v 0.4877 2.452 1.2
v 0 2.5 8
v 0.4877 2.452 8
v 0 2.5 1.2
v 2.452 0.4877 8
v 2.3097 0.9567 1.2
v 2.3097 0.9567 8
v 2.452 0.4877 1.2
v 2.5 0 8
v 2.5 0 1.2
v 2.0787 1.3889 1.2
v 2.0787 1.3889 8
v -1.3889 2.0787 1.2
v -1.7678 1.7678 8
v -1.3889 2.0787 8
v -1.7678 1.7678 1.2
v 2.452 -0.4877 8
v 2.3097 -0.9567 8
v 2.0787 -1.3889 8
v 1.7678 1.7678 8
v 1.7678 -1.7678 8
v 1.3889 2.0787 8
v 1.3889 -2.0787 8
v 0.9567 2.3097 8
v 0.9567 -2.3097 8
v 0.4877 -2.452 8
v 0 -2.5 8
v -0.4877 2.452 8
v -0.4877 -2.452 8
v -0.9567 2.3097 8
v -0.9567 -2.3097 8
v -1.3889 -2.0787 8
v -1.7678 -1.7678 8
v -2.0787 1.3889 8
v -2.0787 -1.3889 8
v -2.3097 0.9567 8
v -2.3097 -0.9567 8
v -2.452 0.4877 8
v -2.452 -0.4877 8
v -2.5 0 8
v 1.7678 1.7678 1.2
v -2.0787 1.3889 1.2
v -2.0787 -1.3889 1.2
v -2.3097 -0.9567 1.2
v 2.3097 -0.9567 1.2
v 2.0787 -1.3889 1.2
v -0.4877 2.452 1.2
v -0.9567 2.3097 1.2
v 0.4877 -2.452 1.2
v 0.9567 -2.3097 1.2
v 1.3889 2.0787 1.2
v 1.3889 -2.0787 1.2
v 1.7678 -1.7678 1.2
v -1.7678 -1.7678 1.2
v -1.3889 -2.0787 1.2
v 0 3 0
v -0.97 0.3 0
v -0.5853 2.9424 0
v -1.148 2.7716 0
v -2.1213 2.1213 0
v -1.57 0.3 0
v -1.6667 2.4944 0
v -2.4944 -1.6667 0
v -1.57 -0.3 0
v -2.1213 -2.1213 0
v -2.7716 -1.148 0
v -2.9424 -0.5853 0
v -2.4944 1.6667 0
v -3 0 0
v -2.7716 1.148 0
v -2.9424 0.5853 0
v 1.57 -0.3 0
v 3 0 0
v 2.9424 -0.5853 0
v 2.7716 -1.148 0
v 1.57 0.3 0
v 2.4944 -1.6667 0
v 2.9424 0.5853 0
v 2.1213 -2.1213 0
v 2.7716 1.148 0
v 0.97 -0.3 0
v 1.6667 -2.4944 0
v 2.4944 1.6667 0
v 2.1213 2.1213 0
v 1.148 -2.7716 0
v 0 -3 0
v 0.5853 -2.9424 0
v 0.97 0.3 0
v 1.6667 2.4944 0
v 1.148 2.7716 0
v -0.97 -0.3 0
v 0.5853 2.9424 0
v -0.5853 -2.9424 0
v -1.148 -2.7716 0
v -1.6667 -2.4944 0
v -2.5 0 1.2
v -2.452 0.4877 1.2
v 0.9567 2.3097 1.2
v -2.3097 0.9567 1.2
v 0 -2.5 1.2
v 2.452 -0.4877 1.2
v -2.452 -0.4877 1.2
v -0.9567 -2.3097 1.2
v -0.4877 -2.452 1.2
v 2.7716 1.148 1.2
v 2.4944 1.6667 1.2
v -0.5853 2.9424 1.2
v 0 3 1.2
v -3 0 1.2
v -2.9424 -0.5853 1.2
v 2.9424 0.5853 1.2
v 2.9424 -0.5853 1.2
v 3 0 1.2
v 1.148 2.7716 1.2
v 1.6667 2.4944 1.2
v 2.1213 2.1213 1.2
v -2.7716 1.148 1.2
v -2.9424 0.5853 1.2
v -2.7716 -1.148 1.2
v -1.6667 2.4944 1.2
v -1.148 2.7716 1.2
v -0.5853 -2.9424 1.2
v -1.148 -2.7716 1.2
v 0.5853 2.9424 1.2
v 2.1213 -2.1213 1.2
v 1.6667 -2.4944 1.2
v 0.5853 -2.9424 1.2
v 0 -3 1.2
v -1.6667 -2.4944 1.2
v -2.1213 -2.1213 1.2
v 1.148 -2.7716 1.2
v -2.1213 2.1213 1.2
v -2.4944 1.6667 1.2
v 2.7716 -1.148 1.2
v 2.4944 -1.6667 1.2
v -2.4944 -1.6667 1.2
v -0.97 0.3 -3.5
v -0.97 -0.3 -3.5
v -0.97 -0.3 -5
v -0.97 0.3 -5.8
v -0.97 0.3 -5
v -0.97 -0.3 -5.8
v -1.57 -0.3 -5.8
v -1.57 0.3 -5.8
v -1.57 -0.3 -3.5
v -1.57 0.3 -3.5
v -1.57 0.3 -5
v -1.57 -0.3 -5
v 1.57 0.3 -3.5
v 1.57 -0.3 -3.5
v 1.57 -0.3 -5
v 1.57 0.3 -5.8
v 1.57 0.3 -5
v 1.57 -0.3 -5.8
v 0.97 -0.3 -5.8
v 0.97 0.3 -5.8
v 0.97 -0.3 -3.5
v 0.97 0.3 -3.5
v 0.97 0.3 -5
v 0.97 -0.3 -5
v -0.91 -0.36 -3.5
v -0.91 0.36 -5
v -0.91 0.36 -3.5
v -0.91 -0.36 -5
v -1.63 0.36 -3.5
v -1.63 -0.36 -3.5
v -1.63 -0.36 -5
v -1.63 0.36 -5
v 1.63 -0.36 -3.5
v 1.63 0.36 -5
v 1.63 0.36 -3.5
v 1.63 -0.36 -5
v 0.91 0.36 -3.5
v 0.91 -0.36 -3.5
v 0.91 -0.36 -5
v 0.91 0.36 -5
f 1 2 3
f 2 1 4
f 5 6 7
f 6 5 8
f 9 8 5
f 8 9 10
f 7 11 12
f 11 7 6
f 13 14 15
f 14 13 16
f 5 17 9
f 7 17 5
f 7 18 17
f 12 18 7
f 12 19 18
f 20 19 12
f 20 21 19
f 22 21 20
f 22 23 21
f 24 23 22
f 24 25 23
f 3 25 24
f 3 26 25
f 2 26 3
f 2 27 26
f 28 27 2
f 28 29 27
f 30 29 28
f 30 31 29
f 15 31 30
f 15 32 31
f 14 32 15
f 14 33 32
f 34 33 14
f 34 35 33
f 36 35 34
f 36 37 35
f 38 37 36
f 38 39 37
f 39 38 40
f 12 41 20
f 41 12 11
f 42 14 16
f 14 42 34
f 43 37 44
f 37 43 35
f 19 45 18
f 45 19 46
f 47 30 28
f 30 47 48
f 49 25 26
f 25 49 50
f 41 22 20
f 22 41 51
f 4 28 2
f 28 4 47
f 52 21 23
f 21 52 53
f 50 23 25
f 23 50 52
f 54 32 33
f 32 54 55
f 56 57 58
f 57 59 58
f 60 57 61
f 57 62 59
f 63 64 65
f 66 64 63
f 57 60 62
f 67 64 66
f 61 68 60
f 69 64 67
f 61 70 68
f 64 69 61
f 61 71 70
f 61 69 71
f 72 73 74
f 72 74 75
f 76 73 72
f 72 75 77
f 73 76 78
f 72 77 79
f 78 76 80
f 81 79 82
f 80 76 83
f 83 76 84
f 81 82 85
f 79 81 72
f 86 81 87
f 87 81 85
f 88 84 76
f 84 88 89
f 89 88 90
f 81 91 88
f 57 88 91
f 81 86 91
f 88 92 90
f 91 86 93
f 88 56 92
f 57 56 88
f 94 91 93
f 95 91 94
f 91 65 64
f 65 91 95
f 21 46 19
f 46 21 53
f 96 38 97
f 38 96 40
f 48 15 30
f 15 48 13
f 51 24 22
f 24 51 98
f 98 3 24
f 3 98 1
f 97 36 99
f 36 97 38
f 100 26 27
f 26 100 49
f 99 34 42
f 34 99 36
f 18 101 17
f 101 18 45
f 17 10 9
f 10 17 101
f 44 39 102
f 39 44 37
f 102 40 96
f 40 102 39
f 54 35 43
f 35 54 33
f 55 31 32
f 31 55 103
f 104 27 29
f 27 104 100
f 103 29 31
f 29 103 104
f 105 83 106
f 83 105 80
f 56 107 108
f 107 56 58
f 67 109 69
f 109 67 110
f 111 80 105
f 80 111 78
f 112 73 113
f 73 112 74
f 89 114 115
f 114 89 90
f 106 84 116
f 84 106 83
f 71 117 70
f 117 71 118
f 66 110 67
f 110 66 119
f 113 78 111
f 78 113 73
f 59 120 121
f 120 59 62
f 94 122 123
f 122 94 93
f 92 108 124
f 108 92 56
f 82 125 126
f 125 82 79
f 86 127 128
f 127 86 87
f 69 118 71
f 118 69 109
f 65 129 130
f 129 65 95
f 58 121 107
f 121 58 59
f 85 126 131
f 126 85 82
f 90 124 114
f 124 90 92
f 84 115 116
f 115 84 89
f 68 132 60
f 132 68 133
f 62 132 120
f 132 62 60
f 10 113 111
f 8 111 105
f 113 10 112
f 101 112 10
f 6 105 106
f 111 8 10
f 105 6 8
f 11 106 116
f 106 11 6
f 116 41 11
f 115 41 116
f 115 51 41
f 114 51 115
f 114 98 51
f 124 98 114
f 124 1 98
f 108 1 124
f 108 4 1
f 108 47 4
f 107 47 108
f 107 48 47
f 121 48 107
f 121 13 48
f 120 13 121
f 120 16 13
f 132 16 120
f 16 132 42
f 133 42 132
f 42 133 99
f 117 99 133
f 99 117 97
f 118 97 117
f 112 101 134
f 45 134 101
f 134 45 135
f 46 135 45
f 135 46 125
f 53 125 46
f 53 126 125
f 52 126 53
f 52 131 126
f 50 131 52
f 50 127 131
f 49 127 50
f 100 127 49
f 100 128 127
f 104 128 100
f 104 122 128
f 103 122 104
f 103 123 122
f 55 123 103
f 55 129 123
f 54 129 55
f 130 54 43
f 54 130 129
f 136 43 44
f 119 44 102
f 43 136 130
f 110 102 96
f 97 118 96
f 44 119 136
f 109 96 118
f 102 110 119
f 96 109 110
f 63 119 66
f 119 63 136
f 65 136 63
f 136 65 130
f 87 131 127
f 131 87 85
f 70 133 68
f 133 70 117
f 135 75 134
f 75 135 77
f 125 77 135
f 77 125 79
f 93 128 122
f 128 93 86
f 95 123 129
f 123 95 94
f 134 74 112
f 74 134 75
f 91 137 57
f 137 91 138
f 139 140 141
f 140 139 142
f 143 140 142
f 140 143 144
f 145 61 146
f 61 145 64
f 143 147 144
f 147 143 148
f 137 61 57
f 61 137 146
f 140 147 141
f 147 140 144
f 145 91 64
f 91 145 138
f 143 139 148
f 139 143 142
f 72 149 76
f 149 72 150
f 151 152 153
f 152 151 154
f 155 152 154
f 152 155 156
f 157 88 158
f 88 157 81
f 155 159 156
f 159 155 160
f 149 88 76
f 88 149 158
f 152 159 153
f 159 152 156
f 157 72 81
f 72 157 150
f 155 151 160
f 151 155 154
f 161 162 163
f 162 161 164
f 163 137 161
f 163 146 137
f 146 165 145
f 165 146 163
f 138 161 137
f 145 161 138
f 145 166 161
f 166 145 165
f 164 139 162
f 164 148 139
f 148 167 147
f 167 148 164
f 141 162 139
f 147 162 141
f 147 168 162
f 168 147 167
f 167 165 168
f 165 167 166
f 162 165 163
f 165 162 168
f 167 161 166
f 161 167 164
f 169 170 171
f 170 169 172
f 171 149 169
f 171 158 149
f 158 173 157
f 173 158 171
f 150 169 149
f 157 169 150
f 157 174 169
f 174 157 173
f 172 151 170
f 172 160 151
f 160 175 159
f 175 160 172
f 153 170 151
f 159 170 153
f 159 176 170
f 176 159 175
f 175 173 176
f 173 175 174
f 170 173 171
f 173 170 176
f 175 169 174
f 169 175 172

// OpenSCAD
// Parameters
led_type = 5; //[3:10:1]
colour = 0; //[0:0:1]
lead = 5; //[2.5:10:0.5]
right_angle = 0; //[0:12:1]
eps = 0.8; //[0.5:2:0.1]
body_d = 5; //[2.5:10:0.5]
body_h = 8; //[4:16:0.5]
rim_t = 1.2; //[0.6:2.4:0.1]
rim_d = 6; //[3:12:0.5]
lead_pitch = 2.54; //[1.27:5.08:0.01]
lead_t = 0.6; //[0.3:1.2:0.05]
solder_len = 1.5; //[0.8:3:0.1]

// LED Module
module led() {
  // LED Body
  color("red") {
    union() {
      // Main body
      translate([0, 0, body_h/2])
        cylinder(r=body_d/2, h=body_h, center=true, $fn=32);
      // Rim
      translate([0, 0, rim_t/2])
        cylinder(r=rim_d/2, h=rim_t, center=true, $fn=32);
    }
  }
  
  // Leads
  color("Silver") {
    union() {
      // Left lead
      translate([-lead_pitch/2, 0, -(lead + eps)/2])
        cube([lead_t, lead_t, lead + eps], center=true);
      // Right lead
      translate([lead_pitch/2, 0, -(lead + eps)/2])
        cube([lead_t, lead_t, lead + eps], center=true);
      // Solder ends
      translate([-lead_pitch/2, 0, -lead + solder_len/2])
        cube([lead_t*1.2, lead_t*1.2, solder_len], center=true);
      translate([lead_pitch/2, 0, -lead + solder_len/2])
        cube([lead_t*1.2, lead_t*1.2, solder_len], center=true);
      
      // Right-angle bends (if applicable)
      if (right_angle > 0) {
        translate([-lead_pitch/2, -right_angle/2 - lead_t/2 + eps, -lead + lead_t/2])
          cube([lead_t, right_angle, lead_t], center=true);
        translate([lead_pitch/2, -right_angle/2 - lead_t/2 + eps, -lead + lead_t/2])
          cube([lead_t, right_angle, lead_t], center=true);
      }
    }
  }
}

// Assembly
module assembly() {
  led();
}

assembly();
